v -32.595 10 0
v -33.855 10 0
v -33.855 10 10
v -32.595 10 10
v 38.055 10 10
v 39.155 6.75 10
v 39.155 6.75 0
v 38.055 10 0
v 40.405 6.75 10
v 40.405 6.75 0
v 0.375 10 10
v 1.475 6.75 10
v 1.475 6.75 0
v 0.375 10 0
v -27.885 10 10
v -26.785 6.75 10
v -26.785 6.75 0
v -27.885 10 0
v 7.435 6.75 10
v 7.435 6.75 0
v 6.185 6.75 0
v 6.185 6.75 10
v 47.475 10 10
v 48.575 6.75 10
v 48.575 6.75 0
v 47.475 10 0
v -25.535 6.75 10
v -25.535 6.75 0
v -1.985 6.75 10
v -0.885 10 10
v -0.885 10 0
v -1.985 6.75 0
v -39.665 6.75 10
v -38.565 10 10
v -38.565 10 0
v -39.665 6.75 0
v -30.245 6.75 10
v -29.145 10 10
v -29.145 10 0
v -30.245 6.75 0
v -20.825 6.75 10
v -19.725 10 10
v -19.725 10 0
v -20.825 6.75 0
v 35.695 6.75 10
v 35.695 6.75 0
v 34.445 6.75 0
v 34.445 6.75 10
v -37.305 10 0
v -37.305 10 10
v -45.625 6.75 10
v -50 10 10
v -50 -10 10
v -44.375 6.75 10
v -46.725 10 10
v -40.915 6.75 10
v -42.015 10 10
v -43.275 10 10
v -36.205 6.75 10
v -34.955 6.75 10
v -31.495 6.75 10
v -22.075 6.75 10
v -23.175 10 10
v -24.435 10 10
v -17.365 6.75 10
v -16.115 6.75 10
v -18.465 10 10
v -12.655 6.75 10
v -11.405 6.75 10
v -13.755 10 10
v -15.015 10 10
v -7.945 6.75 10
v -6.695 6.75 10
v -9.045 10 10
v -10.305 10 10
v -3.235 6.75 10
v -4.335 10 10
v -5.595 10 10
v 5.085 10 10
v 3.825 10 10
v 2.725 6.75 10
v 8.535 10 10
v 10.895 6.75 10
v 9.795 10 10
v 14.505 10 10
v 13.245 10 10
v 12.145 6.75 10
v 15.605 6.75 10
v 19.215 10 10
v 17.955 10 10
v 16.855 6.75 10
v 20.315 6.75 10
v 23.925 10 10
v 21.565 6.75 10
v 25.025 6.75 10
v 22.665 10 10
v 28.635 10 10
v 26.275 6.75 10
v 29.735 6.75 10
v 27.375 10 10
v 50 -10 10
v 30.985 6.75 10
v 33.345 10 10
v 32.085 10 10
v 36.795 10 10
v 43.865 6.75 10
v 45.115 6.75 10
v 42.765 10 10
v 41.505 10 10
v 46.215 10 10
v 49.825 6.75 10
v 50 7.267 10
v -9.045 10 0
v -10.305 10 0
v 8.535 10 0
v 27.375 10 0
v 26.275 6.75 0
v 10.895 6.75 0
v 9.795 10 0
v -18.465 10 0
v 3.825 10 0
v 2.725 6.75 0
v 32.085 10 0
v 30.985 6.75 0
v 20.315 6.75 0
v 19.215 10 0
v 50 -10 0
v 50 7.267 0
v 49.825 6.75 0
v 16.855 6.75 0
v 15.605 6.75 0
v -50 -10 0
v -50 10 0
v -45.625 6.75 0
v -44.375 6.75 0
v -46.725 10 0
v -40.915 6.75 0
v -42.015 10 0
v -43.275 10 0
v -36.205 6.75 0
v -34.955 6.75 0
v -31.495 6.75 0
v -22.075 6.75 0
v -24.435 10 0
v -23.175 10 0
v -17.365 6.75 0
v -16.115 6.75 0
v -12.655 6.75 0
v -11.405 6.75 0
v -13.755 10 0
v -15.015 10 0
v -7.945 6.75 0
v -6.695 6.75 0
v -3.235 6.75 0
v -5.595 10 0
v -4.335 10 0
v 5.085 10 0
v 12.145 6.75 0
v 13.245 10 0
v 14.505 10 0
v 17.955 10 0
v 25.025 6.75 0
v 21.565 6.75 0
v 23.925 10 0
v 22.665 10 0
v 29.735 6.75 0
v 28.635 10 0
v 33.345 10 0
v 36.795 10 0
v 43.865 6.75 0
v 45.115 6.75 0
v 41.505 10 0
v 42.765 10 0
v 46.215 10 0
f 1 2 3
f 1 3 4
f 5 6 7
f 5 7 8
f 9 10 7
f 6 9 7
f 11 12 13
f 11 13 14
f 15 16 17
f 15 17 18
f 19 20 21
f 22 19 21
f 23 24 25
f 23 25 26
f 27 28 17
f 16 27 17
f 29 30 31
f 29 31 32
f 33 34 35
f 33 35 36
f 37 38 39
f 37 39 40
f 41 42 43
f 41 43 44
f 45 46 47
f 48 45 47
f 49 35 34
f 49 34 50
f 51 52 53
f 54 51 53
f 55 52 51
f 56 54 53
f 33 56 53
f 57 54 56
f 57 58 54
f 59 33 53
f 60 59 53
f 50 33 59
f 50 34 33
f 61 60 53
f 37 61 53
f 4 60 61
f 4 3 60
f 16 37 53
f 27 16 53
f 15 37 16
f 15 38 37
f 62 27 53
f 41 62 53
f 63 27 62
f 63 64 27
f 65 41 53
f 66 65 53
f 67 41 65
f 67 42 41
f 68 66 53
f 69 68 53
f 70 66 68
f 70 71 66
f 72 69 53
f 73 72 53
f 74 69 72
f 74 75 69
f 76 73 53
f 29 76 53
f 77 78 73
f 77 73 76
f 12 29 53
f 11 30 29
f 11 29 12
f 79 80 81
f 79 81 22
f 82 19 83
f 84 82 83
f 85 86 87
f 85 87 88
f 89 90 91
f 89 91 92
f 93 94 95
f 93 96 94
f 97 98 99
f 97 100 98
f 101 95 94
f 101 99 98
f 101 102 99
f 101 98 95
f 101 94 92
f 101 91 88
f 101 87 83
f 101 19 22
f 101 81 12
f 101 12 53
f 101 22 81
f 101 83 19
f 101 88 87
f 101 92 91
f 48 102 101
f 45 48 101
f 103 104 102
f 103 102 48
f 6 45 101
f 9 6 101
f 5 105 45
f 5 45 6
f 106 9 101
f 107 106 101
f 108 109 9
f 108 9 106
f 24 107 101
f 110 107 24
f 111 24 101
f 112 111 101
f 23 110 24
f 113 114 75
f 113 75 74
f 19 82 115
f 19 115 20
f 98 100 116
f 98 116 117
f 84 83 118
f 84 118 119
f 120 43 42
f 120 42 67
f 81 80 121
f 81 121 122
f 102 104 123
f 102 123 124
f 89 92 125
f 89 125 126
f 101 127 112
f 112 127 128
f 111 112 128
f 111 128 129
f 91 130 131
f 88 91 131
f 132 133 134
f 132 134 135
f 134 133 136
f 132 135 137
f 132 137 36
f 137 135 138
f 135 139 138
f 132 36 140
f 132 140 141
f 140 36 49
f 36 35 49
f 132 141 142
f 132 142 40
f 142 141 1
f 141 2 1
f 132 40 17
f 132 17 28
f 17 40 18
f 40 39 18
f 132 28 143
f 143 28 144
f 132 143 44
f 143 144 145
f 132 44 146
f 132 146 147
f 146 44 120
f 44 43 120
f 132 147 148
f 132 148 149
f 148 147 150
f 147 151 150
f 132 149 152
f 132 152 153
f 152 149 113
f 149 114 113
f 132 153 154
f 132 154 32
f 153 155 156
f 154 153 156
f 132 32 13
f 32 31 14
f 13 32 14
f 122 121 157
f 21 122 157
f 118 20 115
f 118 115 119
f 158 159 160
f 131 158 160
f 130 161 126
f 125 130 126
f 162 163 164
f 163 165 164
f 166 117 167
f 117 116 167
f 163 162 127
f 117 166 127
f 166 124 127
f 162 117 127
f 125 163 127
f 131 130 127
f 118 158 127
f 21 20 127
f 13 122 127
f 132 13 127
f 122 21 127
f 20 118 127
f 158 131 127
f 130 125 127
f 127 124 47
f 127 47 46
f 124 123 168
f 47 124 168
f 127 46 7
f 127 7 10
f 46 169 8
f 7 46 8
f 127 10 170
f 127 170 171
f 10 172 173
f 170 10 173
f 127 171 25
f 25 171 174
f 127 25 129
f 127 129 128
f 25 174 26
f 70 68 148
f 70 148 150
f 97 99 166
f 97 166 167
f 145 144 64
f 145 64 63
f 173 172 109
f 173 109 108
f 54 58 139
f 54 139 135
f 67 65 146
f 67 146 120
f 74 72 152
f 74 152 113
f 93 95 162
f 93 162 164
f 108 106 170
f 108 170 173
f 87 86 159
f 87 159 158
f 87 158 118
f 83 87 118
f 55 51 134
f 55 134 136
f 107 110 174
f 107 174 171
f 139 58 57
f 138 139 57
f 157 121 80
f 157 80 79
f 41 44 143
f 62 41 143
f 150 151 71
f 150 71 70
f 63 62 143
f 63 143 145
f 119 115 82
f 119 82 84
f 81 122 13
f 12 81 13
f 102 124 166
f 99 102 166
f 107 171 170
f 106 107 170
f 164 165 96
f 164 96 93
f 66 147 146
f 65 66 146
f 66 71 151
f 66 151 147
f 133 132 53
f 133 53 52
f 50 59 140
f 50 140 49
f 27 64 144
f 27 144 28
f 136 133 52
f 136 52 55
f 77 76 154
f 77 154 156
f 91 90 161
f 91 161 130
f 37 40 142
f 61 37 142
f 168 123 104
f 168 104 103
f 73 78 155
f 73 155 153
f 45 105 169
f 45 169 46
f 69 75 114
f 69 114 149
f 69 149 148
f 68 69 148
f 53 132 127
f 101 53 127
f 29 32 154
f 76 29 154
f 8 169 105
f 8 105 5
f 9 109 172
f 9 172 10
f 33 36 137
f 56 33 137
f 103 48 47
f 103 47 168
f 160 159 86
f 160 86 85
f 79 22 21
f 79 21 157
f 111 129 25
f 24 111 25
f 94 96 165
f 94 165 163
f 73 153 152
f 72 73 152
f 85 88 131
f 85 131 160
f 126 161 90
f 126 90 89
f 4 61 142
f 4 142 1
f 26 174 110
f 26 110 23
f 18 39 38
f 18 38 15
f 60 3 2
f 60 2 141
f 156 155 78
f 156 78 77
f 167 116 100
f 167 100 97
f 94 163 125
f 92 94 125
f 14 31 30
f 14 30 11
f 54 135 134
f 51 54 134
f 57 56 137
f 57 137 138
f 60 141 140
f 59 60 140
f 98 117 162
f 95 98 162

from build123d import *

# Parameters (mm, degrees)
CROQUIS1_W              = 100
CROQUIS1_H              = 20
SALIENTE_EXTRUIR1_DEPTH = 10
CORTAR_EXTRUIR1_DEPTH   = 52.961524227
MATRIZL1_COUNT          = 69
MATRIZL1_PITCH          = 4.71


with BuildPart() as part:
    # Croquis1 → Saliente-Extruir1 (new body)
    with BuildSketch(Plane.XY):
        Rectangle(CROQUIS1_W, CROQUIS1_H)
    extrude(amount=SALIENTE_EXTRUIR1_DEPTH)

    # Croquis2 → Cortar-Extruir1 (cut, through all)
    with BuildSketch(Plane.XY.offset(10)):
        Polygon((-43.275, 10), (-44.375, 6.75), (-45.625, 6.75), (-46.725, 10), align=None)
    cortar_extruir1 = extrude(amount=-CORTAR_EXTRUIR1_DEPTH, mode=Mode.SUBTRACT)

    # MatrizL1: Cortar-Extruir1 ×69
    with Locations(*[(i * MATRIZL1_PITCH, 0, 0) for i in range(1, MATRIZL1_COUNT)]):
        add(cortar_extruir1, mode=Mode.SUBTRACT)


solid = part.part
